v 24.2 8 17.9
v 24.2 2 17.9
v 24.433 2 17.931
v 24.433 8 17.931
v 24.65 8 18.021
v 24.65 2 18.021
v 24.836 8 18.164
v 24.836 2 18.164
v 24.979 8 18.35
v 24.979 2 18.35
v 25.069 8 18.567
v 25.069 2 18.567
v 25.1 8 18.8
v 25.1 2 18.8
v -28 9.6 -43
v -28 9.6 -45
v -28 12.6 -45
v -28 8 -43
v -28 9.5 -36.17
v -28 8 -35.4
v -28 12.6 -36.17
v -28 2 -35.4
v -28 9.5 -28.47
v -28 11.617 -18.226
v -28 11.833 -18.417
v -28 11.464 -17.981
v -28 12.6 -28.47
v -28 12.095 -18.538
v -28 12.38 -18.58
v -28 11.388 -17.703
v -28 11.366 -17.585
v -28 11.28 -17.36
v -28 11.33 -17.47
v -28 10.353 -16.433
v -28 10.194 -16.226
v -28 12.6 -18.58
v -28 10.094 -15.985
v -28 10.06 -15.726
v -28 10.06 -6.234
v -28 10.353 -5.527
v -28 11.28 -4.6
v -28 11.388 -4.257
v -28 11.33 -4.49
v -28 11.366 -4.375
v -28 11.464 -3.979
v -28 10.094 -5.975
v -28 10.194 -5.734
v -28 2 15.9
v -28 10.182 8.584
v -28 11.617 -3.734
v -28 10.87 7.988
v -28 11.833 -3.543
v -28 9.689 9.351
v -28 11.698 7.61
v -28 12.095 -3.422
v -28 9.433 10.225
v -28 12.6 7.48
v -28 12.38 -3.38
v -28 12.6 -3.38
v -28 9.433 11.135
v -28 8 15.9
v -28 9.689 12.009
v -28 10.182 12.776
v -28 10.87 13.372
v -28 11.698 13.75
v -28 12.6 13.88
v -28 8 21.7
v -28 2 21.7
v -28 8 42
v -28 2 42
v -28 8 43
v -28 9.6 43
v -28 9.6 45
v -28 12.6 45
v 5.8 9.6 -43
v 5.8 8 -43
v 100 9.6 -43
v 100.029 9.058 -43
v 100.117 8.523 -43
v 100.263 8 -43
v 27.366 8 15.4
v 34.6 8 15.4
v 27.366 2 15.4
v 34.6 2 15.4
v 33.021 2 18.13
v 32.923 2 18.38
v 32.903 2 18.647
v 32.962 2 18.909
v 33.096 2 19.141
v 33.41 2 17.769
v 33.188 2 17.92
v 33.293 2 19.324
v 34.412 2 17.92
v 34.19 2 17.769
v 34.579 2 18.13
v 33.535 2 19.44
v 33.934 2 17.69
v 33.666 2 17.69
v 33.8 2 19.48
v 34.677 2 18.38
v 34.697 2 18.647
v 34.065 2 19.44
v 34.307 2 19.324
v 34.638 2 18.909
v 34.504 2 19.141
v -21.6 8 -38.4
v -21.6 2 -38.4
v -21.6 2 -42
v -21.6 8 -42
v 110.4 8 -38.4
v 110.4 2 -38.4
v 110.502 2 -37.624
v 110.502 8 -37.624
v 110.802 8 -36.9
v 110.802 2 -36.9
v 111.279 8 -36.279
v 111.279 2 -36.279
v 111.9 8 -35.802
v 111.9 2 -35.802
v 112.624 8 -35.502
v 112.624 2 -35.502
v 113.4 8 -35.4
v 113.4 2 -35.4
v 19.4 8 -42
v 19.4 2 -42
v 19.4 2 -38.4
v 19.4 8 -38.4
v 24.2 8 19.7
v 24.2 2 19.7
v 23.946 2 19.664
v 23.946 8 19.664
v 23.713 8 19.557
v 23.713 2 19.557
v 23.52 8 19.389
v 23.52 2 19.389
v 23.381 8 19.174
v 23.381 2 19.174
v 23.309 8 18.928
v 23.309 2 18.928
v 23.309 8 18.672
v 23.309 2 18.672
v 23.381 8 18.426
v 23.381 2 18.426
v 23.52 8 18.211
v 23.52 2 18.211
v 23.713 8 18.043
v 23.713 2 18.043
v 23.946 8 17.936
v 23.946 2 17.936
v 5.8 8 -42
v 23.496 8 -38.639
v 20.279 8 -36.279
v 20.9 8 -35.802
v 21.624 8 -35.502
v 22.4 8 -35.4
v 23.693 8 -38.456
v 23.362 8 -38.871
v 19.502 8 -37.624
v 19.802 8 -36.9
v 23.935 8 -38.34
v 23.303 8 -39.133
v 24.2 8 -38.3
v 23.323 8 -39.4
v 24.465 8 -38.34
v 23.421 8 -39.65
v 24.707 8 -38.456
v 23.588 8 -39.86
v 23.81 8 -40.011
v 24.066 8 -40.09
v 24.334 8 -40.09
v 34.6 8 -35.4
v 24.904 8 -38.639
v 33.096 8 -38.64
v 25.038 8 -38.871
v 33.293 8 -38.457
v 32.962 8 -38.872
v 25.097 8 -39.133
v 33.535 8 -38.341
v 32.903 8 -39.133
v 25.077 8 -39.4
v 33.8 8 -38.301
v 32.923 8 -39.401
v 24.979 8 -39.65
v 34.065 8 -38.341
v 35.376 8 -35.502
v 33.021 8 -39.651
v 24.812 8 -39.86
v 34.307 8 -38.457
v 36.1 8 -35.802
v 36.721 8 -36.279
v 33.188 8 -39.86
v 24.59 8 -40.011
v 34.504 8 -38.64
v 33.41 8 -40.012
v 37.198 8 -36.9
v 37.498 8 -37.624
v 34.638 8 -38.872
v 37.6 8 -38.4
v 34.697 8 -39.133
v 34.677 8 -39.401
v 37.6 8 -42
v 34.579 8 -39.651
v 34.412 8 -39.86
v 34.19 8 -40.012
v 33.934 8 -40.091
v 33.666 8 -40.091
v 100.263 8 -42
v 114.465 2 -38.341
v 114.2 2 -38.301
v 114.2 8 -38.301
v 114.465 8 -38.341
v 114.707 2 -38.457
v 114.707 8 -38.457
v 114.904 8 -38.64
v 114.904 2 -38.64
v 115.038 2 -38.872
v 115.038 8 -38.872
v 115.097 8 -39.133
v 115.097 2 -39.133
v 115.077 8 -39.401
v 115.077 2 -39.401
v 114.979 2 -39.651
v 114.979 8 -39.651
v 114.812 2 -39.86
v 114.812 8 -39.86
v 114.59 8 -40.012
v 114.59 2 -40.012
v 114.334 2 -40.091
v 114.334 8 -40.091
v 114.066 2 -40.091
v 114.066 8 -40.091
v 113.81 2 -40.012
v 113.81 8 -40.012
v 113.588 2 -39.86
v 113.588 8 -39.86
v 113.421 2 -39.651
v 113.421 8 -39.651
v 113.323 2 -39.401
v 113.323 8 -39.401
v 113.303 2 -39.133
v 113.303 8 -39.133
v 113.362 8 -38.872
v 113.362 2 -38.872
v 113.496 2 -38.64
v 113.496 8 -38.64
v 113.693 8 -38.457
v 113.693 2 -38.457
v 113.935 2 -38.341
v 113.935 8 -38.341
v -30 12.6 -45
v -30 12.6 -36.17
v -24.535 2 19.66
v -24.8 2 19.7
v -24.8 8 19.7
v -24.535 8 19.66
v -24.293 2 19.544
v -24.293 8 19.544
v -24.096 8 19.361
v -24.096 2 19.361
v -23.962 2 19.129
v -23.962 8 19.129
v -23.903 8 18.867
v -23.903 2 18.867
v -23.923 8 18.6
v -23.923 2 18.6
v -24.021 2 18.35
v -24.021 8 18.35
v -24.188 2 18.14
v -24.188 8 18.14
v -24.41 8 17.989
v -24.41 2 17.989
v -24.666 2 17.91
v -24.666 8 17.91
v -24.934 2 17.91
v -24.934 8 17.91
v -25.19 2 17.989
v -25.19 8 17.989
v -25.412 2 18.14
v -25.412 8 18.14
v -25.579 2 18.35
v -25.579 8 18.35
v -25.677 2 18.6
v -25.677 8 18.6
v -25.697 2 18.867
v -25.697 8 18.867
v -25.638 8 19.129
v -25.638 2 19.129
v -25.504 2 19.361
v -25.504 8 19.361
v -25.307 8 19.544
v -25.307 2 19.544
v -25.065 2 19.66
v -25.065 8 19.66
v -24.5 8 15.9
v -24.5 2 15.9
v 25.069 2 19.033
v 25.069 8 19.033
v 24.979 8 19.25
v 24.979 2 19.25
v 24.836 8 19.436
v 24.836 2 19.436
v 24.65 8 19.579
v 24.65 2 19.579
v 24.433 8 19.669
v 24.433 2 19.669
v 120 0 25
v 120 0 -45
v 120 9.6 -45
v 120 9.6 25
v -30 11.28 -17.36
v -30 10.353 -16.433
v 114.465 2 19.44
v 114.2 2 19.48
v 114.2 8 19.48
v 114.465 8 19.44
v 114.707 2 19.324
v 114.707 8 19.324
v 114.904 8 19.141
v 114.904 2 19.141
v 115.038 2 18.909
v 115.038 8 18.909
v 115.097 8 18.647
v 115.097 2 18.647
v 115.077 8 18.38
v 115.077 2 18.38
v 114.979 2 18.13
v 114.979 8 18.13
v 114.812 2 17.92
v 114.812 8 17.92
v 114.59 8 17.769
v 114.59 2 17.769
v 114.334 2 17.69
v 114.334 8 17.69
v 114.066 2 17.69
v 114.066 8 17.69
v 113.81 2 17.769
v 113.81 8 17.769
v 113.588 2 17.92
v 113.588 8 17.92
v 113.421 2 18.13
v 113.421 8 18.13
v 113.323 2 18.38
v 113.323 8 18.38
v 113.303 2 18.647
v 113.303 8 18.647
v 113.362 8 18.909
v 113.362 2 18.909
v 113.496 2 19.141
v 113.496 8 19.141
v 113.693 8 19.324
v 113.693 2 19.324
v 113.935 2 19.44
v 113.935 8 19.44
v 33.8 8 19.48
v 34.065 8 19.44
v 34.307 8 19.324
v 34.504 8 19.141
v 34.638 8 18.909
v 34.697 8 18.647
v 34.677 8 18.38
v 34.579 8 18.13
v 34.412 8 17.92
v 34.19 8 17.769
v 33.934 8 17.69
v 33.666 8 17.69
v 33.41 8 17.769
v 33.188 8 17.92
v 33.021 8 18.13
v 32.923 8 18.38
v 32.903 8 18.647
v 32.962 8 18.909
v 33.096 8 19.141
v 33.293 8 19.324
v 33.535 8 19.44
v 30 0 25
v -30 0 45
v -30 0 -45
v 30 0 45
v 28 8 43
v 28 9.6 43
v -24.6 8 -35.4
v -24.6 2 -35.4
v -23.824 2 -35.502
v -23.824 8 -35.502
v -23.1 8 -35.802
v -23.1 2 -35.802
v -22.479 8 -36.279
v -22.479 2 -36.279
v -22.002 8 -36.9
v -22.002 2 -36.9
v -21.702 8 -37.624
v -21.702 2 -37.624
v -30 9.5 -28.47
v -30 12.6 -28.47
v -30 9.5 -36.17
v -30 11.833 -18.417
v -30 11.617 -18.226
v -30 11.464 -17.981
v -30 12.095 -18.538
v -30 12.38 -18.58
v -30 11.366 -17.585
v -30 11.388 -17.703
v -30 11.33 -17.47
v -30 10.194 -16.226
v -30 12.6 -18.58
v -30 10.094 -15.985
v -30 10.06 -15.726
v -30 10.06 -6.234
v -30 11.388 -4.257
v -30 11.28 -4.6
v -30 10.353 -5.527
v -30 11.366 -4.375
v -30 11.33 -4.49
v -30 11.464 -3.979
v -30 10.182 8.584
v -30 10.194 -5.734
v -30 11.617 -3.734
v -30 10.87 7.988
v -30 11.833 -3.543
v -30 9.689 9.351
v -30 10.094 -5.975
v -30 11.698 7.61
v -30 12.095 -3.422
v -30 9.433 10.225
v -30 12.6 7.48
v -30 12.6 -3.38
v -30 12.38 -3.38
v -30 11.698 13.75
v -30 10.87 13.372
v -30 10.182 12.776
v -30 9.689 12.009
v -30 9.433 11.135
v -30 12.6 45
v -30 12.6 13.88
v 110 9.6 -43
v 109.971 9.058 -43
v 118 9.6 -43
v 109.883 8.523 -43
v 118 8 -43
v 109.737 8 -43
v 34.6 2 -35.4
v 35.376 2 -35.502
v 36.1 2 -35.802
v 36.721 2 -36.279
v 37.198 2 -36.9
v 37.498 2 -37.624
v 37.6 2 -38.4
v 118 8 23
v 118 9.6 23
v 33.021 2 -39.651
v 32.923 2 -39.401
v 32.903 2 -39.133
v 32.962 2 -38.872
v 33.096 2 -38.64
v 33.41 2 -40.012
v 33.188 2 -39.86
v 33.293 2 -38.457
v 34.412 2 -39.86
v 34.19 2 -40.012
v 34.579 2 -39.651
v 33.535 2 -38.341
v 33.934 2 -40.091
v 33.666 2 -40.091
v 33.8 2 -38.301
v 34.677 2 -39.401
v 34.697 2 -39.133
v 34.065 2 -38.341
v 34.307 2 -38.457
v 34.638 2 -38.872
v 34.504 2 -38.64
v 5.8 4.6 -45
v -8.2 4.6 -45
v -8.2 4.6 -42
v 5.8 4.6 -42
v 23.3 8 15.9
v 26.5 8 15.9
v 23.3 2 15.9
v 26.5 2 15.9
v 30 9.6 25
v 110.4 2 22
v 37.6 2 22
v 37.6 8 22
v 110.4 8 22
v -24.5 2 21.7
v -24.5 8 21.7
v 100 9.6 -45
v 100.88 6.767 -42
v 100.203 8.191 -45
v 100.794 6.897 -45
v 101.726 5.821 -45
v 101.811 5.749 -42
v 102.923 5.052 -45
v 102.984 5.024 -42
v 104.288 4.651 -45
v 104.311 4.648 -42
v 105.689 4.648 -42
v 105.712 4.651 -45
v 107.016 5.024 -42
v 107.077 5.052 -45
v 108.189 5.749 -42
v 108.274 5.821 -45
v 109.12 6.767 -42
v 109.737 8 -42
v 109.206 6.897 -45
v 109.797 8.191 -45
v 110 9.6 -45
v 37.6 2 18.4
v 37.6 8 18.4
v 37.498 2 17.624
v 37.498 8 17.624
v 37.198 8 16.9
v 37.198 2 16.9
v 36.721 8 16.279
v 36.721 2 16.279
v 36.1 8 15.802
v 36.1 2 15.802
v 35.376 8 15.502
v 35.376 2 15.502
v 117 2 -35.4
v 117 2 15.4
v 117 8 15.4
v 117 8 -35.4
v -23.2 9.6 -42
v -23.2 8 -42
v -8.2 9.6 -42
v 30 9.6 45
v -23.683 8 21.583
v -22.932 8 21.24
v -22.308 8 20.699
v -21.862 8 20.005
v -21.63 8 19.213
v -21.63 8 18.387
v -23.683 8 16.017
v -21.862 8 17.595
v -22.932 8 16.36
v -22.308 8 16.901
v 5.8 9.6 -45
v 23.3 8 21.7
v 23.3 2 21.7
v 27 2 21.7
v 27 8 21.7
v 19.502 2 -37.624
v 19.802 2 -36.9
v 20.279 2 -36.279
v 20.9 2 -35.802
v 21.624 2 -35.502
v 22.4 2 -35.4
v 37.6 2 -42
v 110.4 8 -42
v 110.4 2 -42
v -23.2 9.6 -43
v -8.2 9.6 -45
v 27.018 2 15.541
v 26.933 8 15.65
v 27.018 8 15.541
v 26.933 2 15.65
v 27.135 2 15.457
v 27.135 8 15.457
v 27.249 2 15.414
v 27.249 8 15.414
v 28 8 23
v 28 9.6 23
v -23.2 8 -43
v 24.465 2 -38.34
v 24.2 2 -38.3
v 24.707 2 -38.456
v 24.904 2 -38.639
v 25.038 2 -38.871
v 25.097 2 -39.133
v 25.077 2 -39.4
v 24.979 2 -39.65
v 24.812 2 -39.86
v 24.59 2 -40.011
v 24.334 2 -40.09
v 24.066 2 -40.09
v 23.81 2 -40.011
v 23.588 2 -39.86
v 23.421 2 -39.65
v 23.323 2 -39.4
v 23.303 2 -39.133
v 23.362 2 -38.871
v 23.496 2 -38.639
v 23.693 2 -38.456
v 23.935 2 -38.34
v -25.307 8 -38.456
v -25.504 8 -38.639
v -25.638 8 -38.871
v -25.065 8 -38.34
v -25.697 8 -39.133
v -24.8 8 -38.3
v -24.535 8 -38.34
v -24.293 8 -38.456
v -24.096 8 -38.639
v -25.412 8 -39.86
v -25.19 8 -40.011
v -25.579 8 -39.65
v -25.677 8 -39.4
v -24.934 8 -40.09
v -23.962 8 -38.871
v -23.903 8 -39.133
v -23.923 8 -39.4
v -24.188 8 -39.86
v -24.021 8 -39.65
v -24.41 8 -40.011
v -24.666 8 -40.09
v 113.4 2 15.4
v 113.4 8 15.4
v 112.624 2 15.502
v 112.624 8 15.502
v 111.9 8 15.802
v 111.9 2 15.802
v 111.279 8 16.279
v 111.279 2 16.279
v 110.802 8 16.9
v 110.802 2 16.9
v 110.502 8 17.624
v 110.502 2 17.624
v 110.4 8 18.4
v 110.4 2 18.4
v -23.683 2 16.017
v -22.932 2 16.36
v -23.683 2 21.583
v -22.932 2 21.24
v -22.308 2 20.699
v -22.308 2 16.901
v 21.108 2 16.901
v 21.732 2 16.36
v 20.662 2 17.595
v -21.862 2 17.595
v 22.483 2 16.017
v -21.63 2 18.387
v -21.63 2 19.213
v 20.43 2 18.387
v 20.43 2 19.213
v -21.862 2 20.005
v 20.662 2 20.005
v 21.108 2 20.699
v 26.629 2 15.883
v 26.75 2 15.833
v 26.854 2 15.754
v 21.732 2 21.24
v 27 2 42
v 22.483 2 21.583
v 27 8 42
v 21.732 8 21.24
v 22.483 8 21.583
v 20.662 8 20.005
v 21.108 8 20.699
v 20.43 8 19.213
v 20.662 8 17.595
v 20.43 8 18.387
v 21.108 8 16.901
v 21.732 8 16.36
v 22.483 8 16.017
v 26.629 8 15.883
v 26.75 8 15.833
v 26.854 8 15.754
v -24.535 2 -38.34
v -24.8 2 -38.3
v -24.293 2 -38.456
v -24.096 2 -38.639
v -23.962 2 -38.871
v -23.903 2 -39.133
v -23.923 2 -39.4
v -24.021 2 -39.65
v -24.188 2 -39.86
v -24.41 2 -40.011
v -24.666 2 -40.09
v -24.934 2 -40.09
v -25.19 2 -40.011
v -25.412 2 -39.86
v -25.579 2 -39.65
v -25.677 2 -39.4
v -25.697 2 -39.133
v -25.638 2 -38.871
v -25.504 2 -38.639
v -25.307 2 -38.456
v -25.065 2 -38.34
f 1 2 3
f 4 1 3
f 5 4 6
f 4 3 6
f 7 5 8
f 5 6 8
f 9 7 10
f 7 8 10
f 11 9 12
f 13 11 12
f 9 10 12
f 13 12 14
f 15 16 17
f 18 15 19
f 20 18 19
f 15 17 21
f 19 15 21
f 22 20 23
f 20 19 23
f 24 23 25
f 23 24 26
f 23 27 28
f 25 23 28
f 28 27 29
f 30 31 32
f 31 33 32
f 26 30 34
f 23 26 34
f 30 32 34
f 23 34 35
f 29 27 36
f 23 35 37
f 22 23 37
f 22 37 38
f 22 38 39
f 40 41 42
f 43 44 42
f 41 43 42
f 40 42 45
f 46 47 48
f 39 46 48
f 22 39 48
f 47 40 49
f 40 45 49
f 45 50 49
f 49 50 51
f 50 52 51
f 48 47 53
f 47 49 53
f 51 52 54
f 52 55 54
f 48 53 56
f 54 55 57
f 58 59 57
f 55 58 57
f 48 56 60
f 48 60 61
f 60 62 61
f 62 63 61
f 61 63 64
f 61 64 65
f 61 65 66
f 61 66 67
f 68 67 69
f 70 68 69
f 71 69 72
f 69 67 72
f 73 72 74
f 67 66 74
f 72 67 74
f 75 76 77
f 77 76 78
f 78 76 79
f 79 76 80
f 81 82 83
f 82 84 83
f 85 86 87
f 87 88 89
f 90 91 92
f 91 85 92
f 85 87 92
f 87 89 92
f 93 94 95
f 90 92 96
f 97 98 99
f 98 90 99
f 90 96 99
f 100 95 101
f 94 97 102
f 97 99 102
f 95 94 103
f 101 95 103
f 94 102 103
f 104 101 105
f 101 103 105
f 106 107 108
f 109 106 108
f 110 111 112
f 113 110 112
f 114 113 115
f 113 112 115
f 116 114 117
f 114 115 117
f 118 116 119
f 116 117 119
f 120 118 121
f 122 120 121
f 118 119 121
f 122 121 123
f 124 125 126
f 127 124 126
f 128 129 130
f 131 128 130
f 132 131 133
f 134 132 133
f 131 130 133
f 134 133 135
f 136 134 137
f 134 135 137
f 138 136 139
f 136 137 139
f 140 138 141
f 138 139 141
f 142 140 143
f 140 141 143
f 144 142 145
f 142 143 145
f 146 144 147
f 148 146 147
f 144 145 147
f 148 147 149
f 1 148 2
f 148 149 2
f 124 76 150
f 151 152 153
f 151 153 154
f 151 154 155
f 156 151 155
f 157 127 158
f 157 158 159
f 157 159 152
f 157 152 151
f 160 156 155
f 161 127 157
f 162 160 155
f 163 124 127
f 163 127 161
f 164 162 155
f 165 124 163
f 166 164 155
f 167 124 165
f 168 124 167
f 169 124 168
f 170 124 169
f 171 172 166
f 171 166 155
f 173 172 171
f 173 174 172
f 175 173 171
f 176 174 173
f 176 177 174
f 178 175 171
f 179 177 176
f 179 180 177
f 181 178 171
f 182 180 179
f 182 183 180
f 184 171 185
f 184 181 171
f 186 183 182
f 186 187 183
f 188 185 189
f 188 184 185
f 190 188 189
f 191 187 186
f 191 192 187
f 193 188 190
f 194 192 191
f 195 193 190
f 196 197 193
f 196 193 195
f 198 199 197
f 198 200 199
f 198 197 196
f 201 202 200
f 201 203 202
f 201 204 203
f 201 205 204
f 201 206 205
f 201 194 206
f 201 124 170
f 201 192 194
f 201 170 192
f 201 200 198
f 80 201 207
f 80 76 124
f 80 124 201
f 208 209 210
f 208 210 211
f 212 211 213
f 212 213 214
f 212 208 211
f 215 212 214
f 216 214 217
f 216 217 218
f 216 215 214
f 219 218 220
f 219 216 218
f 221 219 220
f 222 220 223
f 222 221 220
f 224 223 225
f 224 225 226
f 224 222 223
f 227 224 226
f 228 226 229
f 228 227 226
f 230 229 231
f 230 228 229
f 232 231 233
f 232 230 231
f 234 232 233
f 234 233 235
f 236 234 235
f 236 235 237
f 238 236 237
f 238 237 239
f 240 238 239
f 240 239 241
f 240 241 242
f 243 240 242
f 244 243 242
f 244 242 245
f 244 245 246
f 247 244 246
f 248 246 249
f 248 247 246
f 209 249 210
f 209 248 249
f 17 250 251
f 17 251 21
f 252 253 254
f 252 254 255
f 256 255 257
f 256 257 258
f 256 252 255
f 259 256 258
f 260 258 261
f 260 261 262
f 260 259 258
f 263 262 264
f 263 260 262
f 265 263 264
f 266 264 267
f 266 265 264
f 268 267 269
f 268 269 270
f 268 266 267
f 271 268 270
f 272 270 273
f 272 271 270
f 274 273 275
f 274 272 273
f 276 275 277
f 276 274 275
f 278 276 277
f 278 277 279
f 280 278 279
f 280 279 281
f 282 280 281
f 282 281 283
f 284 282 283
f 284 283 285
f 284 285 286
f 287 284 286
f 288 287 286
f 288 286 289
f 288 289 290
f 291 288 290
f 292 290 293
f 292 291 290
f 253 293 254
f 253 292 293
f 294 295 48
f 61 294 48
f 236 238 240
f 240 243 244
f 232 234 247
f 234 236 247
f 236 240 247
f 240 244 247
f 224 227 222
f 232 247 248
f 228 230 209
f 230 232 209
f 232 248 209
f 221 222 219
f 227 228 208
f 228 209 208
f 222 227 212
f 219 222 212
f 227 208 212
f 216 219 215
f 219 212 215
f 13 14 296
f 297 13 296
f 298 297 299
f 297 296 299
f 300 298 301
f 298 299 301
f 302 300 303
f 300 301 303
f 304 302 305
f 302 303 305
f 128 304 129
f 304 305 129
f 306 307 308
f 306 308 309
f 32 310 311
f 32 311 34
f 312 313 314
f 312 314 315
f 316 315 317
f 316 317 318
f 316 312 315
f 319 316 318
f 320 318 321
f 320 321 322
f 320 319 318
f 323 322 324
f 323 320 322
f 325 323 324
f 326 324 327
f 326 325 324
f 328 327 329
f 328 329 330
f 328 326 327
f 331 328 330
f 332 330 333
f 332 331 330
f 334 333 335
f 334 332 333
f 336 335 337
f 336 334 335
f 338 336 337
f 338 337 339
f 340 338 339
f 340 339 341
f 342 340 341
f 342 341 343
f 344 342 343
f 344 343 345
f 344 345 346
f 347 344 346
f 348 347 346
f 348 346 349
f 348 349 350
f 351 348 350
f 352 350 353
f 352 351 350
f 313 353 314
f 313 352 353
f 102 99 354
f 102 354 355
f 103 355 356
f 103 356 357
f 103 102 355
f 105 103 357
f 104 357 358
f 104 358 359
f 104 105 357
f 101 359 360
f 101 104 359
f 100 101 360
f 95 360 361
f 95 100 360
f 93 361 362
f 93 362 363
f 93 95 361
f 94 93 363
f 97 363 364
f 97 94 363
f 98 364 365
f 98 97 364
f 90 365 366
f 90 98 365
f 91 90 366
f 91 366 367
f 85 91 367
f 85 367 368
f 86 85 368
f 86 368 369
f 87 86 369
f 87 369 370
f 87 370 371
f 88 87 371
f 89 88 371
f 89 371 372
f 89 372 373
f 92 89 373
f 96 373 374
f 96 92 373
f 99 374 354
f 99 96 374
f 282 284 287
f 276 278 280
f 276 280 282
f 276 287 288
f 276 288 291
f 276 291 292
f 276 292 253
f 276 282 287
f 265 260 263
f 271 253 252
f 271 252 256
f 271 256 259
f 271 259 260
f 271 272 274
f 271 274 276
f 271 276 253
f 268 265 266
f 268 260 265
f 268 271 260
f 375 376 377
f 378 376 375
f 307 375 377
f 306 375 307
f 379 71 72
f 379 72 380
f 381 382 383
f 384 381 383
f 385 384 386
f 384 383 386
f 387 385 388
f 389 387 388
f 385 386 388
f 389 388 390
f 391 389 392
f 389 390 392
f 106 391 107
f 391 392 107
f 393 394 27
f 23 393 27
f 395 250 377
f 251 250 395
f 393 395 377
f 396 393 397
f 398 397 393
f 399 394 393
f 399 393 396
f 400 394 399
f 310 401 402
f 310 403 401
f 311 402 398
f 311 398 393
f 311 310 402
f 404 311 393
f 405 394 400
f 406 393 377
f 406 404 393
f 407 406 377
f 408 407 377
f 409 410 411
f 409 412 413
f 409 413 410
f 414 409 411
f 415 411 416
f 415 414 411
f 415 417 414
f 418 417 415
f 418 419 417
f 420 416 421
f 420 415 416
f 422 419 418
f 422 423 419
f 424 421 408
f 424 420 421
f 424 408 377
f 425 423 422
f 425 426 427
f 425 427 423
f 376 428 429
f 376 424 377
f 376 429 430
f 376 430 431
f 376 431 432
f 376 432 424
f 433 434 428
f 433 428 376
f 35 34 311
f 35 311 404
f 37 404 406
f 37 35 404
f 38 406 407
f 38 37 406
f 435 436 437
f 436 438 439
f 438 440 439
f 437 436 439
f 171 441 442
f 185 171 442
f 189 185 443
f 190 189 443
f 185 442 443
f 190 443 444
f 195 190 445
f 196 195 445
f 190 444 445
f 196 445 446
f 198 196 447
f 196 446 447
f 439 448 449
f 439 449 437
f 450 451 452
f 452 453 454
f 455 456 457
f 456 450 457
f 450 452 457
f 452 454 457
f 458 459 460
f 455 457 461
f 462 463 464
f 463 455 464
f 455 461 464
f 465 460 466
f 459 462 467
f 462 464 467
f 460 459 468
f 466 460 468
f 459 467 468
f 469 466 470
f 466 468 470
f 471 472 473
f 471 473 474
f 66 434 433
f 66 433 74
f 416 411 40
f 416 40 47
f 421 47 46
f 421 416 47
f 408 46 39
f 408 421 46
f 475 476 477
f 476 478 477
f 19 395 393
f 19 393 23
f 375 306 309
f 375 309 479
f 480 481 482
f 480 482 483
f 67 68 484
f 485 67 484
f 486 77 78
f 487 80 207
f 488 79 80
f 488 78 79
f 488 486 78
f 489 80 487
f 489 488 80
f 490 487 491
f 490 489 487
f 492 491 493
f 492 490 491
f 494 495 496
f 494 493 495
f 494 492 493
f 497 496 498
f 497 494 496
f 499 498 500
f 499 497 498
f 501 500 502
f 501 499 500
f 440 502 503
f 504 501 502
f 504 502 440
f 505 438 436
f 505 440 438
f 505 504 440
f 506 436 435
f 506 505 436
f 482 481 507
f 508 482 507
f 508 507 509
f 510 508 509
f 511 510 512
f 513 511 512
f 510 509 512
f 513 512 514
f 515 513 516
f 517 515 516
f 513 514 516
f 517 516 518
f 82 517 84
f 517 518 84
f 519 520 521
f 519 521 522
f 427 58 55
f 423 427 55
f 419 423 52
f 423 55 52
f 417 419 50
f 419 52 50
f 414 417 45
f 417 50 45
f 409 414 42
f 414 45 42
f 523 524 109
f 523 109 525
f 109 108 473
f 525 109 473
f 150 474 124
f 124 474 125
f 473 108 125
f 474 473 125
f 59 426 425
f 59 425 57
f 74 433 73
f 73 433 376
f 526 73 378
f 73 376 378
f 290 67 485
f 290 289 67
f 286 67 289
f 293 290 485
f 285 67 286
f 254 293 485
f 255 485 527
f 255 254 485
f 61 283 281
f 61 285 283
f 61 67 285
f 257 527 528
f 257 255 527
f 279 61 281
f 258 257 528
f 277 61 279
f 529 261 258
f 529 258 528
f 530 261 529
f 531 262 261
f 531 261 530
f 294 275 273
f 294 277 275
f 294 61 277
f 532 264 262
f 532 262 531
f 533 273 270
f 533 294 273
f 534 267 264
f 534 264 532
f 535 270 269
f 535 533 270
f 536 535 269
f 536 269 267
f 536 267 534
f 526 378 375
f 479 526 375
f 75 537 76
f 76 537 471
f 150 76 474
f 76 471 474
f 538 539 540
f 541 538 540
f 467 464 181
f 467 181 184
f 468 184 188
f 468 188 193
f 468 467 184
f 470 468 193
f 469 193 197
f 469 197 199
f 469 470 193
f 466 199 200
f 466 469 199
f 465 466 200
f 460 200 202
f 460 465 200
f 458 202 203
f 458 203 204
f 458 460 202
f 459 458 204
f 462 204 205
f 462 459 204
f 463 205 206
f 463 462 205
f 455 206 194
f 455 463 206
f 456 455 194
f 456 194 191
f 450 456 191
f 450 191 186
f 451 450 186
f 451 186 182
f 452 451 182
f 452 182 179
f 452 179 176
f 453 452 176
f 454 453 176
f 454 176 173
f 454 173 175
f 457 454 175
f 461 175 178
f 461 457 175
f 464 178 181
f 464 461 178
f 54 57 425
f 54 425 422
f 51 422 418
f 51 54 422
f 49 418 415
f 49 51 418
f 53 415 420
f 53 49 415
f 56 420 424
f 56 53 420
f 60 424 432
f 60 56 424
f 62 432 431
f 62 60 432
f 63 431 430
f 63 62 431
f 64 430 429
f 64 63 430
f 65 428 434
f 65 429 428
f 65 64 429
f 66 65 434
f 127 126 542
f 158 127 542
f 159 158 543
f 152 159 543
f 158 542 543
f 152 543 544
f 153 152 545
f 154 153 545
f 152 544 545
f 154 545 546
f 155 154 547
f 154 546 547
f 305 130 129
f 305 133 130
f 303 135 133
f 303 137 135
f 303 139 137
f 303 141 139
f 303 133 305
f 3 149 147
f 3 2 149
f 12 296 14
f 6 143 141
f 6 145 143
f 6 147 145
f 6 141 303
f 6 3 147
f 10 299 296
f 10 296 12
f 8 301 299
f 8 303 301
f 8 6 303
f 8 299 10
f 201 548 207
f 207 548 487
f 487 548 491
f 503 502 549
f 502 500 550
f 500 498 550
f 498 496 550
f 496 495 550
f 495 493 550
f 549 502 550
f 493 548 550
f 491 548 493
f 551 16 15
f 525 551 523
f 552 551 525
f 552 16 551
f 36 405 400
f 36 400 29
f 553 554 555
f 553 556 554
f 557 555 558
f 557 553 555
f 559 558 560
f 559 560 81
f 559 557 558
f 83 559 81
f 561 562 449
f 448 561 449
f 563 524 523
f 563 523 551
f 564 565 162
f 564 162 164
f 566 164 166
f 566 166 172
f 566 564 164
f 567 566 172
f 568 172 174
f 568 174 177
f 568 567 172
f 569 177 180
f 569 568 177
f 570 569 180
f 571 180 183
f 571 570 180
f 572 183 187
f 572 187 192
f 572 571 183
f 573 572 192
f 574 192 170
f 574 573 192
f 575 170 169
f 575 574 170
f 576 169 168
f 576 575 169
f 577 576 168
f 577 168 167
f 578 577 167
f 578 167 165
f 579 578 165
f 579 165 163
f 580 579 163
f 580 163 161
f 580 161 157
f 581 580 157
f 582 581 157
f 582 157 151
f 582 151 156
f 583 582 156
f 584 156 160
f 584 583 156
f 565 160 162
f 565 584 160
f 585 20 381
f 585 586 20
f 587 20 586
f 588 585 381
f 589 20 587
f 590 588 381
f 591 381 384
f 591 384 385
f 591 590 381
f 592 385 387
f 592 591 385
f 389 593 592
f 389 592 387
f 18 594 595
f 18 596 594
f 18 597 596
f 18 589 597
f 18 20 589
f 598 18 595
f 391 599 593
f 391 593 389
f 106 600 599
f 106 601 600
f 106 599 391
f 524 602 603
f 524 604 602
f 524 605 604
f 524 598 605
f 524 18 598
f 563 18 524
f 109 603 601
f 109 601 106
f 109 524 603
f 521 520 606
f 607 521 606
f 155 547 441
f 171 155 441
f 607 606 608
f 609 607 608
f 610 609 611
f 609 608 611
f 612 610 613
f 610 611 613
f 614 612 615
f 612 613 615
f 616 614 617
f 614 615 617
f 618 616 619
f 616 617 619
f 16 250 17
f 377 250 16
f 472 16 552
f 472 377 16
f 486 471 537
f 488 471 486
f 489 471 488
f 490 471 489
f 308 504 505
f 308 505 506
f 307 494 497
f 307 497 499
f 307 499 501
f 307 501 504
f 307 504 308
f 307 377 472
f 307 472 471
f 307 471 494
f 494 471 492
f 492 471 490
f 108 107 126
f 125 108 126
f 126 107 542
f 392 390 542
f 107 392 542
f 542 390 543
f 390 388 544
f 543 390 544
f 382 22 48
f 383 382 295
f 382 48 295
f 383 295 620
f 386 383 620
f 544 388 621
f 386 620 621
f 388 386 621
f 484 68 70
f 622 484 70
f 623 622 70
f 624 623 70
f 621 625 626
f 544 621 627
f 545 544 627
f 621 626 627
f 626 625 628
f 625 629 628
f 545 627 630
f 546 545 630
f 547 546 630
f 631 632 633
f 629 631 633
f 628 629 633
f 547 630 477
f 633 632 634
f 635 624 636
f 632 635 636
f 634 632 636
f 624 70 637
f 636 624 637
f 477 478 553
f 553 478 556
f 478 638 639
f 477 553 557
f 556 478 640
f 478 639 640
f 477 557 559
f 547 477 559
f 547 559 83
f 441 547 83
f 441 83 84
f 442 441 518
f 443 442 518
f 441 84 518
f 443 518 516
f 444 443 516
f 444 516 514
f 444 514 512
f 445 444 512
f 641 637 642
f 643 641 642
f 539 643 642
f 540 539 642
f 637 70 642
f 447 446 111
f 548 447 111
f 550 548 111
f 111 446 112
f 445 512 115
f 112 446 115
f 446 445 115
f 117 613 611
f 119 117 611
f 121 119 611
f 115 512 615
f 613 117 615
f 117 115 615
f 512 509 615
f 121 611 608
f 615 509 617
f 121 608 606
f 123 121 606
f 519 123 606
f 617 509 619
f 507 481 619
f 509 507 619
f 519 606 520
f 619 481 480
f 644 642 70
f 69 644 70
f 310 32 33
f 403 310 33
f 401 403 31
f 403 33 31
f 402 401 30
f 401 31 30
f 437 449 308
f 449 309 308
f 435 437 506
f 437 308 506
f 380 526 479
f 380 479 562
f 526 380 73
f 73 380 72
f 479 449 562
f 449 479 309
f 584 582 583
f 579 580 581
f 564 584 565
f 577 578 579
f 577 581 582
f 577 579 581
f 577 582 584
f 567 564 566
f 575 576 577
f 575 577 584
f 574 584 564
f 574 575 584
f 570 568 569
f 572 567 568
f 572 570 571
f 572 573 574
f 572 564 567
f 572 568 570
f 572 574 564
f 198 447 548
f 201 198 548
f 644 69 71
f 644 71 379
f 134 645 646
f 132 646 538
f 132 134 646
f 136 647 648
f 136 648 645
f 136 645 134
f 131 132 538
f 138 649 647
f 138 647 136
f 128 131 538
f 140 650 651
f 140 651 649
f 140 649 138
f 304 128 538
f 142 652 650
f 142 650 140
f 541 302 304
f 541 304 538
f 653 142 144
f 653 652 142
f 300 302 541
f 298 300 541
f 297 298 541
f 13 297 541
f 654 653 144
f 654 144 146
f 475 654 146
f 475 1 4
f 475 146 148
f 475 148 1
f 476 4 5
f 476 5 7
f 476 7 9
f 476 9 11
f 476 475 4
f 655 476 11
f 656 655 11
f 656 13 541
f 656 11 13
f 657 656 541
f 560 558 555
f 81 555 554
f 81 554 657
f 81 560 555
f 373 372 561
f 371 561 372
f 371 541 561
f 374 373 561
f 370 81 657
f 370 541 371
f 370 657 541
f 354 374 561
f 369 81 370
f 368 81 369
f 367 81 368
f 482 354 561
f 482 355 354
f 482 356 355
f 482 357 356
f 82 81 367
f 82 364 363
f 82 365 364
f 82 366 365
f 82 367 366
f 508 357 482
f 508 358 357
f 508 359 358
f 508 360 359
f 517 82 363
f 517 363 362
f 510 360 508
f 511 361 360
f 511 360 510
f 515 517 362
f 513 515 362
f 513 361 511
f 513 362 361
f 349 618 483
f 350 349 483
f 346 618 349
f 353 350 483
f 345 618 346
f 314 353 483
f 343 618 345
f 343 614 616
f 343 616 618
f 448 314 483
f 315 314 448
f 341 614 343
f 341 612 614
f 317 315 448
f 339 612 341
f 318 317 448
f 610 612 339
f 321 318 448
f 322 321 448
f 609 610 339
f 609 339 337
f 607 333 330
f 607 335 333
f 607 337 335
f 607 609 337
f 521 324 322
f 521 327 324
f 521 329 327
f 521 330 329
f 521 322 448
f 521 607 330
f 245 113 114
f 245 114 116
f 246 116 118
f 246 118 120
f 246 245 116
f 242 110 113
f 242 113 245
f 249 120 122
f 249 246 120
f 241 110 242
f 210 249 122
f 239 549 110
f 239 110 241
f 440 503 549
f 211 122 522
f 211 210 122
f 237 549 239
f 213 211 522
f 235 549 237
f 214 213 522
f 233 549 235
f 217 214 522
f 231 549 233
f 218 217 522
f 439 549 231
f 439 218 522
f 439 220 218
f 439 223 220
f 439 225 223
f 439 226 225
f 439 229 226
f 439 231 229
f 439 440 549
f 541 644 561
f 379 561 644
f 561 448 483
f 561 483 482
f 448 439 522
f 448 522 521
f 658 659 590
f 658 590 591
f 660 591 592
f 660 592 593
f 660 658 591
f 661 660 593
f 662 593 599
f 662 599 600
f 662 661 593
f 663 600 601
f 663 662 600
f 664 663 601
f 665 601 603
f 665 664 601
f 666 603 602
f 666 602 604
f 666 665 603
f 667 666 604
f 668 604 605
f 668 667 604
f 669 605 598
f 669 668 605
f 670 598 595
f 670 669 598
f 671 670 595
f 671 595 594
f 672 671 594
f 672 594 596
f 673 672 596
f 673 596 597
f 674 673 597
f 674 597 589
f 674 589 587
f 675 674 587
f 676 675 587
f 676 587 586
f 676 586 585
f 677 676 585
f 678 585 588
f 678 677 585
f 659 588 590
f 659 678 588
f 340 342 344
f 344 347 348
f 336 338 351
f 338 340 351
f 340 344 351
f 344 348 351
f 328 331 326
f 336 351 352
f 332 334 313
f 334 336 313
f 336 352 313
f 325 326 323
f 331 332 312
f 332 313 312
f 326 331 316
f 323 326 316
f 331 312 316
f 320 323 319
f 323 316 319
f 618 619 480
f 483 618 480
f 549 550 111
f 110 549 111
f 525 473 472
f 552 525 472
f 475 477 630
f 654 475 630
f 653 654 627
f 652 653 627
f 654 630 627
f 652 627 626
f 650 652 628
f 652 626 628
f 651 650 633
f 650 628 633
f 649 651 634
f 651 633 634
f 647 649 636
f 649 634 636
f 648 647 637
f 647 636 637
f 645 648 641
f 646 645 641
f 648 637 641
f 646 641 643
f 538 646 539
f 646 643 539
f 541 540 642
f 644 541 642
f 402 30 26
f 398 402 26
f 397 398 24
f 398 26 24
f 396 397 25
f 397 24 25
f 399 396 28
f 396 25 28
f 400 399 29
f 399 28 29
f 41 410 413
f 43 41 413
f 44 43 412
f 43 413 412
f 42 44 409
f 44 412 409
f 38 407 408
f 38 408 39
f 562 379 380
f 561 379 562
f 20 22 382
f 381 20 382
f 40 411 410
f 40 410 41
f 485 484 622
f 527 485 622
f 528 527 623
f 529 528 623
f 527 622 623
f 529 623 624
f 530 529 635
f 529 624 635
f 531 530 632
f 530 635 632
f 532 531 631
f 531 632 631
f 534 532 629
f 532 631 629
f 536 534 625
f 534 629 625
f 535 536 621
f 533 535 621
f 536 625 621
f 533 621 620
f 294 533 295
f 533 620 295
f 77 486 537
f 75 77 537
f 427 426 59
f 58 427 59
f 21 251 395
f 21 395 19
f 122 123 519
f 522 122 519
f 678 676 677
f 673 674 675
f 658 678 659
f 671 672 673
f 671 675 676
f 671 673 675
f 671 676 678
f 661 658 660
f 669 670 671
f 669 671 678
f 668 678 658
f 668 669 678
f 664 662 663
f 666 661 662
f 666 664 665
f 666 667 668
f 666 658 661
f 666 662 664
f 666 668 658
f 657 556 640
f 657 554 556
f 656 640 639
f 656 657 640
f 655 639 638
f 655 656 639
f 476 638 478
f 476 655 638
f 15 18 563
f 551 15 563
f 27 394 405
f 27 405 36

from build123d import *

# Parameters (mm, degrees)
SKETCH1_W           = 60
SKETCH1_H           = 90
BOSS_EXTRUDE1_DEPTH = 2
SKETCH2_W           = 60
SKETCH2_H           = 90
SKETCH2_W_2         = 56
SKETCH2_H_2         = 86
BOSS_EXTRUDE2_DEPTH = 10.6
CUT_EXTRUDE1_DEPTH  = 3
SKETCH15_W          = 90
SKETCH15_H          = 70
BOSS_EXTRUDE6_DEPTH = 2
BOSS_EXTRUDE7_DEPTH = 7.6
SKETCH4_R           = 0.9
BOSS_EXTRUDE3_DEPTH = 6
SKETCH18_W          = 2
SKETCH18_H          = 66
CUT_EXTRUDE11_DEPTH = 1.6
SKETCH7_W           = 14
SKETCH7_H           = 1
BOSS_EXTRUDE4_DEPTH = 2.6
SKETCH8_W           = 14
SKETCH8_H           = 2
CUT_EXTRUDE2_DEPTH  = 5
SKETCH9_W           = 15
SKETCH9_H           = 1
BOSS_EXTRUDE5_DEPTH = 7.6
SKETCH10_W          = 2
SKETCH10_H          = 7.7
CUT_EXTRUDE3_DEPTH  = 3.1
SKETCH11_W          = 2
SKETCH11_H          = 15.2
CUT_EXTRUDE4_DEPTH  = 1.22
SKETCH12_W          = 2
SKETCH12_H          = 12.76
CUT_EXTRUDE6_DEPTH  = 1.32
CUT_EXTRUDE7_REACH  = 157.202
FILLET6_R           = 1
CHAMFER2_SIZE       = 1.22
FILLET7_R           = 1
SKETCH19_W          = 88
SKETCH19_H          = 66
SKETCH19_W_2        = 86
SKETCH19_H_2        = 64
SKETCH19_R          = 0.9
BOSS_EXTRUDE9_DEPTH = 6
SKETCH20_W          = 4
SKETCH20_H          = 50.8
CUT_EXTRUDE12_DEPTH = 6
FILLET8_R           = 0.5
FILLET9_R           = 0.5
CUT_EXTRUDE13_DEPTH = 10


# Some blends are built 0.0001 mm under size
with BuildPart() as part:
    # Sketch1 → Boss-Extrude1 (new body)
    with BuildSketch(Plane(origin=(0, 0, 0), x_dir=(1, 0, 0), z_dir=(0, 1, 0))):
        Rectangle(SKETCH1_W, SKETCH1_H)
    extrude(amount=BOSS_EXTRUDE1_DEPTH)

    # Sketch2 → Boss-Extrude2 (add)
    with BuildSketch(Plane(origin=(0, 2, 0), x_dir=(1, 0, 0), z_dir=(0, 1, 0))):
        Rectangle(SKETCH2_W, SKETCH2_H)
        Rectangle(SKETCH2_W_2, SKETCH2_H_2, mode=Mode.SUBTRACT)
    extrude(amount=BOSS_EXTRUDE2_DEPTH)

    # Sketch3 → Cut-Extrude1 (cut)
    with BuildSketch(Plane(origin=(0, 12.6, 0), x_dir=(1, 0, 0), z_dir=(0, 1, 0))):
        Polygon((-28, -43), (28, -43), (28, 43), (-28, 43), (-28, 45), (30, 45), (30, -45), (-28, -45), align=None)
    extrude(amount=-CUT_EXTRUDE1_DEPTH, mode=Mode.SUBTRACT)

    # Sketch15 → Boss-Extrude6 (add)
    with BuildSketch(Plane.XZ):
        with Locations((75, -10)):
            Rectangle(SKETCH15_W, SKETCH15_H)
    extrude(amount=-BOSS_EXTRUDE6_DEPTH)

    # Sketch16 → Boss-Extrude7 (add)
    with BuildSketch(Plane(origin=(0, 2, 0), x_dir=(1, 0, 0), z_dir=(0, 1, 0))):
        Polygon((118, 43), (30, 43), (30, 45), (120, 45), (120, -25), (30, -25), (30, -23), (118, -23), align=None)
    extrude(amount=BOSS_EXTRUDE7_DEPTH)

    # Sketch4 → Boss-Extrude3 (add)
    # profile 1 of 5: a face of its own
    with BuildSketch(Plane(origin=(0, 2, 0), x_dir=(1, 0, 0), z_dir=(0, 1, 0))):
        with BuildLine():
            Line((24.2, -21.7), (27, -21.7))
            Line((27, -21.7), (27, -42))
            Line((27, -42), (-28, -42))
            Line((-28, -42), (-28, -43))
            Line((-28, -43), (28, -43))
            Line((28, -43), (28, 43))
            Line((28, 43), (5.8, 43))
            Line((5.8, 43), (5.8, 42))
            Line((5.8, 42), (19.4, 42))
            Line((19.4, 42), (27, 42))
            Line((27, 42), (27, 35.4))
            Line((27, 35.4), (27, -15.9))
            Line((27, -15.9), (24.2, -15.9))
            Line((24.2, -15.9), (24.2, -17.9))
            ThreePointArc((24.2, -17.9), (24.836396103, -18.163603897), (25.1, -18.8))
            ThreePointArc((25.1, -18.8), (24.836396103, -19.436396103), (24.2, -19.7))
            Line((24.2, -19.7), (24.2, -21.7))
        make_face()
    # profile 2 of 5: a face of its own
    with BuildSketch(Plane(origin=(0, 2, 0), x_dir=(1, 0, 0), z_dir=(0, 1, 0))):
        with BuildLine():
            Line((23.3, -21.7), (24.2, -21.7))
            Line((24.2, -21.7), (24.2, -19.7))
            ThreePointArc((24.2, -19.7), (23.3, -18.8), (24.2, -17.9))
            Line((24.2, -17.9), (24.2, -15.9))
            Line((24.2, -15.9), (23.3, -15.9))
            ThreePointArc((23.3, -15.9), (20.4, -18.8), (23.3, -21.7))
        make_face()
    # profile 3 of 5: a face of its own
    with BuildSketch(Plane(origin=(0, 2, 0), x_dir=(1, 0, 0), z_dir=(0, 1, 0))):
        with BuildLine():
            Line((-28, -15.9), (-28, -21.7))
            Line((-28, -21.7), (-24.5, -21.7))
            ThreePointArc((-24.5, -21.7), (-21.6, -18.8), (-24.5, -15.9))
            Line((-24.5, -15.9), (-28, -15.9))
        make_face()
        with Locations(Location((-24.8, -18.8, 0), (0, 0, 270))):
            Circle(SKETCH4_R, mode=Mode.SUBTRACT)
    # profile 4 of 5: a face of its own
    with BuildSketch(Plane(origin=(0, 2, 0), x_dir=(1, 0, 0), z_dir=(0, 1, 0))):
        with BuildLine():
            Line((-28, 43), (-28, 35.4))
            Line((-28, 35.4), (-24.6, 35.4))
            ThreePointArc((-24.6, 35.4), (-22.478679656, 36.278679656), (-21.6, 38.4))
            Line((-21.6, 38.4), (-21.6, 43))
            Line((-21.6, 43), (-28, 43))
        make_face()
        with Locations(Location((-24.8, 39.2, 0), (0, 0, 270))):
            Circle(SKETCH4_R, mode=Mode.SUBTRACT)
    # profile 5 of 5: a face of its own
    with BuildSketch(Plane(origin=(0, 2, 0), x_dir=(1, 0, 0), z_dir=(0, 1, 0))):
        with BuildLine():
            Line((22.4, 35.4), (27, 35.4))
            Line((27, 35.4), (27, 42))
            Line((27, 42), (19.4, 42))
            Line((19.4, 42), (19.4, 38.4))
            ThreePointArc((19.4, 38.4), (20.278679656, 36.278679656), (22.4, 35.4))
        make_face()
        with Locations(Location((24.2, 39.2, 0), (0, 0, 270))):
            Circle(SKETCH4_R, mode=Mode.SUBTRACT)
    extrude(amount=BOSS_EXTRUDE3_DEPTH)

    # Sketch18 → Cut-Extrude11 (cut)
    with BuildSketch(Plane(origin=(0, 9.6, 0), x_dir=(1, 0, 0), z_dir=(0, 1, 0))):
        with Locations((29, 10)):
            Rectangle(SKETCH18_W, SKETCH18_H)
    extrude(amount=-CUT_EXTRUDE11_DEPTH, mode=Mode.SUBTRACT)

    # Sketch7 → Boss-Extrude4 (add)
    with BuildSketch(Plane(origin=(0, 2, 0), x_dir=(1, 0, 0), z_dir=(0, 1, 0))):
        with Locations((-1.2, 42.5)):
            Rectangle(SKETCH7_W, SKETCH7_H)
    extrude(amount=BOSS_EXTRUDE4_DEPTH)

    # Sketch8 → Cut-Extrude2 (cut)
    with BuildSketch(Plane(origin=(0, 9.6, 0), x_dir=(1, 0, 0), z_dir=(0, 1, 0))):
        with Locations((-1.2, 44)):
            Rectangle(SKETCH8_W, SKETCH8_H)
    extrude(amount=-CUT_EXTRUDE2_DEPTH, mode=Mode.SUBTRACT)

    # Sketch9 → Boss-Extrude5 (add)
    with BuildSketch(Plane(origin=(0, 2, 0), x_dir=(1, 0, 0), z_dir=(0, 1, 0))):
        with Locations((-15.7, 42.5)):
            Rectangle(SKETCH9_W, SKETCH9_H)
    extrude(amount=BOSS_EXTRUDE5_DEPTH)

    # Sketch10 → Cut-Extrude3 (cut)
    with BuildSketch(Plane(origin=(0, 12.6, 0), x_dir=(1, 0, 0), z_dir=(0, 1, 0))):
        with Locations((-29, 32.32)):
            Rectangle(SKETCH10_W, SKETCH10_H)
    extrude(amount=-CUT_EXTRUDE3_DEPTH, mode=Mode.SUBTRACT)

    # Sketch11 → Cut-Extrude4 (cut)
    with BuildSketch(Plane(origin=(0, 12.6, 0), x_dir=(1, 0, 0), z_dir=(0, 1, 0))):
        with Locations((-29, 10.98)):
            Rectangle(SKETCH11_W, SKETCH11_H)
    extrude(amount=-CUT_EXTRUDE4_DEPTH, mode=Mode.SUBTRACT)

    # Sketch12 → Cut-Extrude6 (cut)
    with BuildSketch(Plane(origin=(0, 11.38, 0), x_dir=(1, 0, 0), z_dir=(0, 1, 0))):
        with Locations((-29, 10.98)):
            Rectangle(SKETCH12_W, SKETCH12_H)
    extrude(amount=-CUT_EXTRUDE6_DEPTH, mode=Mode.SUBTRACT)

    # Sketch13 → Cut-Extrude7 (cut, up to next)
    with BuildSketch(Plane(origin=(-28, 0, 0), x_dir=(0, 0, -1), z_dir=(1, 0, 0)), mode=Mode.PRIVATE) as cut_extrude7_sk1:
        with BuildLine():
            Line((-13.88, 12.6), (-7.48, 12.6))
            ThreePointArc((-7.48, 12.6), (-10.68, 9.4), (-13.88, 12.6))
        make_face()
    cut_extrude7_tool1 = extrude(cut_extrude7_sk1.sketch, amount=-CUT_EXTRUDE7_REACH, mode=Mode.PRIVATE) & part.part
    add(cut_extrude7_tool1.solids().sort_by_distance((-28, 11.241878, 10.68))[0], mode=Mode.SUBTRACT)

    # Fillet6
    fillet6_edges = [part.edges().sort_by_distance(p)[0] for p in [
        (-29, 11.38, -18.58),
        (-29, 11.38, -3.38),
    ]]
    fillet(fillet6_edges, radius=FILLET6_R)

    # Chamfer2
    chamfer2_edges = [part.edges().sort_by_distance(p)[0] for p in [
        (-29, 10.06, -17.36),
        (-29, 10.06, -4.6),
    ]]
    chamfer(chamfer2_edges, length=CHAMFER2_SIZE)

    # Fillet7
    # the kernel refuses this fillet: 1 mm, written as the material it adds along each edge
    with BuildSketch(Plane(origin=(-28, 10.06, -16.14), x_dir=(0, 0.7071067811865454, -0.7071067811865497), z_dir=(-1, 0, 0))) as fillet7_piece_1:
        with BuildLine():
            CenterArc((FILLET7_R * 0.414213562373, -FILLET7_R), FILLET7_R, 90, 45)
            Line((-FILLET7_R * 0.292893218813, -FILLET7_R * 0.292893218813), (0, 0))
            Line((0, 0), (FILLET7_R * 0.414213562373, 0))
        make_face()
    extrude(amount=2)
    with BuildSketch(Plane(origin=(-30, 10.06, -5.82), x_dir=(0, 0, -1), z_dir=(1, 0, 0))) as fillet7_piece_2:
        with BuildLine():
            CenterArc((FILLET7_R * 0.414213562373, FILLET7_R), FILLET7_R, 225, 45)
            Line((-FILLET7_R * 0.292893218813, FILLET7_R * 0.292893218813), (0, 0))
            Line((0, 0), (FILLET7_R * 0.414213562373, 0))
        make_face()
    extrude(amount=2)
    # the kernel refuses this fillet: 1 mm, written as the material it takes off along each edge
    with BuildSketch(Plane(origin=(-30.857621037, 11.38, -4.6), x_dir=(0, -1.0, 1.3882228699547056e-11), z_dir=(1, 0, 0)), Plane(origin=(-27.142378963, 11.38, -17.36), x_dir=(0, -1.0, -1.3891110483744069e-11), z_dir=(-1, 0, 0))) as fillet7_2_piece_1:
        with BuildLine():
            CenterArc((0.984822149, -0.465928927), FILLET7_R, 152.229642834, 20.707135911)
            Line((-0.007588926, -0.342964463), (-0.106830033, -0.330668017))
            ThreePointArc((-0.106830033, -0.330668017), (-0.1, -0.22), (-0.1, 0))
            Line((-0.1, 0), (0, 0.1))
            ThreePointArc((0, 0.1), (0.05, 0.1), (0.011517785, 0.046592893))
            Line((0.011517785, 0.046592893), (0.1, 0))
        make_face()
    extrude(amount=3.715242074, mode=Mode.SUBTRACT)

    # Sketch19 → Boss-Extrude9 (add)
    # profile 1 of 5: a face of its own
    with BuildSketch(Plane(origin=(0, 2, 0), x_dir=(1, 0, 0), z_dir=(0, 1, 0))):
        with Locations((74, 10)):
            Rectangle(SKETCH19_W, SKETCH19_H)
        with Locations((74, 10)):
            Rectangle(SKETCH19_W_2, SKETCH19_H_2, mode=Mode.SUBTRACT)
    # profile 2 of 5: a face of its own
    with BuildSketch(Plane(origin=(0, 2, 0), x_dir=(1, 0, 0), z_dir=(0, 1, 0))):
        with BuildLine():
            Line((37.6, 38.4), (37.6, 42))
            Line((37.6, 42), (31, 42))
            Line((31, 42), (31, 35.4))
            Line((31, 35.4), (34.6, 35.4))
            ThreePointArc((34.6, 35.4), (36.721320344, 36.278679656), (37.6, 38.4))
        make_face()
        with Locations(Location((33.8, 39.200675532, 0), (0, 0, 270))):
            Circle(SKETCH19_R, mode=Mode.SUBTRACT)
    # profile 3 of 5: a face of its own
    with BuildSketch(Plane(origin=(0, 2, 0), x_dir=(1, 0, 0), z_dir=(0, 1, 0))):
        with BuildLine():
            Line((117, 35.4), (117, 42))
            Line((117, 42), (110.4, 42))
            Line((110.4, 42), (110.4, 38.4))
            ThreePointArc((110.4, 38.4), (111.278679656, 36.278679656), (113.4, 35.4))
            Line((113.4, 35.4), (117, 35.4))
        make_face()
        with Locations(Location((114.2, 39.200675532, 0), (0, 0, 270))):
            Circle(SKETCH19_R, mode=Mode.SUBTRACT)
    # profile 4 of 5: a face of its own
    with BuildSketch(Plane(origin=(0, 2, 0), x_dir=(1, 0, 0), z_dir=(0, 1, 0))):
        with BuildLine():
            Line((117, -22), (117, -15.4))
            Line((117, -15.4), (113.4, -15.4))
            ThreePointArc((113.4, -15.4), (111.278679656, -16.278679656), (110.4, -18.4))
            Line((110.4, -18.4), (110.4, -22))
            Line((110.4, -22), (117, -22))
        make_face()
        with Locations(Location((114.2, -18.58, 0), (0, 0, 270))):
            Circle(SKETCH19_R, mode=Mode.SUBTRACT)
    # profile 5 of 5: a face of its own
    with BuildSketch(Plane(origin=(0, 2, 0), x_dir=(1, 0, 0), z_dir=(0, 1, 0))):
        with BuildLine():
            Line((34.6, -15.4), (31, -15.4))
            Line((31, -15.4), (31, -22))
            Line((31, -22), (37.6, -22))
            Line((37.6, -22), (37.6, -18.4))
            ThreePointArc((37.6, -18.4), (36.721320344, -16.278679656), (34.6, -15.4))
        make_face()
        with Locations(Location((33.8, -18.58, 0), (0, 0, 270))):
            Circle(SKETCH19_R, mode=Mode.SUBTRACT)
    extrude(amount=BOSS_EXTRUDE9_DEPTH)

    # Sketch20 → Cut-Extrude12 (cut)
    with BuildSketch(Plane(origin=(0, 8, 0), x_dir=(1, 0, 0), z_dir=(0, 1, 0))):
        with Locations((29, 10)):
            Rectangle(SKETCH20_W, SKETCH20_H)
    extrude(amount=-CUT_EXTRUDE12_DEPTH, mode=Mode.SUBTRACT)

    # Fillet8
    fillet8_edges = [part.edges().sort_by_distance(p)[0] for p in [
        (27, 5, 15.9),
    ]]
    fillet(fillet8_edges, radius=FILLET8_R - 0.0001)  # a hair under: the kernel refuses the full size

    # Fillet9
    fillet9_edges = [part.edges().sort_by_distance(p)[0] for p in [
        (27, 5, 15.4),
    ]]
    fillet(fillet9_edges, radius=FILLET9_R)

    # Sketch21 → Cut-Extrude13 (cut)
    with BuildSketch(Plane(origin=(0, 0, -45), x_dir=(-1, 0, 0), z_dir=(0, 0, -1))):
        with BuildLine():
            Line((-110, 9.6), (-100, 9.6))
            ThreePointArc((-100, 9.6), (-105, 4.6), (-110, 9.6))
        make_face()
    extrude(amount=-CUT_EXTRUDE13_DEPTH, mode=Mode.SUBTRACT)


solid = part.part
